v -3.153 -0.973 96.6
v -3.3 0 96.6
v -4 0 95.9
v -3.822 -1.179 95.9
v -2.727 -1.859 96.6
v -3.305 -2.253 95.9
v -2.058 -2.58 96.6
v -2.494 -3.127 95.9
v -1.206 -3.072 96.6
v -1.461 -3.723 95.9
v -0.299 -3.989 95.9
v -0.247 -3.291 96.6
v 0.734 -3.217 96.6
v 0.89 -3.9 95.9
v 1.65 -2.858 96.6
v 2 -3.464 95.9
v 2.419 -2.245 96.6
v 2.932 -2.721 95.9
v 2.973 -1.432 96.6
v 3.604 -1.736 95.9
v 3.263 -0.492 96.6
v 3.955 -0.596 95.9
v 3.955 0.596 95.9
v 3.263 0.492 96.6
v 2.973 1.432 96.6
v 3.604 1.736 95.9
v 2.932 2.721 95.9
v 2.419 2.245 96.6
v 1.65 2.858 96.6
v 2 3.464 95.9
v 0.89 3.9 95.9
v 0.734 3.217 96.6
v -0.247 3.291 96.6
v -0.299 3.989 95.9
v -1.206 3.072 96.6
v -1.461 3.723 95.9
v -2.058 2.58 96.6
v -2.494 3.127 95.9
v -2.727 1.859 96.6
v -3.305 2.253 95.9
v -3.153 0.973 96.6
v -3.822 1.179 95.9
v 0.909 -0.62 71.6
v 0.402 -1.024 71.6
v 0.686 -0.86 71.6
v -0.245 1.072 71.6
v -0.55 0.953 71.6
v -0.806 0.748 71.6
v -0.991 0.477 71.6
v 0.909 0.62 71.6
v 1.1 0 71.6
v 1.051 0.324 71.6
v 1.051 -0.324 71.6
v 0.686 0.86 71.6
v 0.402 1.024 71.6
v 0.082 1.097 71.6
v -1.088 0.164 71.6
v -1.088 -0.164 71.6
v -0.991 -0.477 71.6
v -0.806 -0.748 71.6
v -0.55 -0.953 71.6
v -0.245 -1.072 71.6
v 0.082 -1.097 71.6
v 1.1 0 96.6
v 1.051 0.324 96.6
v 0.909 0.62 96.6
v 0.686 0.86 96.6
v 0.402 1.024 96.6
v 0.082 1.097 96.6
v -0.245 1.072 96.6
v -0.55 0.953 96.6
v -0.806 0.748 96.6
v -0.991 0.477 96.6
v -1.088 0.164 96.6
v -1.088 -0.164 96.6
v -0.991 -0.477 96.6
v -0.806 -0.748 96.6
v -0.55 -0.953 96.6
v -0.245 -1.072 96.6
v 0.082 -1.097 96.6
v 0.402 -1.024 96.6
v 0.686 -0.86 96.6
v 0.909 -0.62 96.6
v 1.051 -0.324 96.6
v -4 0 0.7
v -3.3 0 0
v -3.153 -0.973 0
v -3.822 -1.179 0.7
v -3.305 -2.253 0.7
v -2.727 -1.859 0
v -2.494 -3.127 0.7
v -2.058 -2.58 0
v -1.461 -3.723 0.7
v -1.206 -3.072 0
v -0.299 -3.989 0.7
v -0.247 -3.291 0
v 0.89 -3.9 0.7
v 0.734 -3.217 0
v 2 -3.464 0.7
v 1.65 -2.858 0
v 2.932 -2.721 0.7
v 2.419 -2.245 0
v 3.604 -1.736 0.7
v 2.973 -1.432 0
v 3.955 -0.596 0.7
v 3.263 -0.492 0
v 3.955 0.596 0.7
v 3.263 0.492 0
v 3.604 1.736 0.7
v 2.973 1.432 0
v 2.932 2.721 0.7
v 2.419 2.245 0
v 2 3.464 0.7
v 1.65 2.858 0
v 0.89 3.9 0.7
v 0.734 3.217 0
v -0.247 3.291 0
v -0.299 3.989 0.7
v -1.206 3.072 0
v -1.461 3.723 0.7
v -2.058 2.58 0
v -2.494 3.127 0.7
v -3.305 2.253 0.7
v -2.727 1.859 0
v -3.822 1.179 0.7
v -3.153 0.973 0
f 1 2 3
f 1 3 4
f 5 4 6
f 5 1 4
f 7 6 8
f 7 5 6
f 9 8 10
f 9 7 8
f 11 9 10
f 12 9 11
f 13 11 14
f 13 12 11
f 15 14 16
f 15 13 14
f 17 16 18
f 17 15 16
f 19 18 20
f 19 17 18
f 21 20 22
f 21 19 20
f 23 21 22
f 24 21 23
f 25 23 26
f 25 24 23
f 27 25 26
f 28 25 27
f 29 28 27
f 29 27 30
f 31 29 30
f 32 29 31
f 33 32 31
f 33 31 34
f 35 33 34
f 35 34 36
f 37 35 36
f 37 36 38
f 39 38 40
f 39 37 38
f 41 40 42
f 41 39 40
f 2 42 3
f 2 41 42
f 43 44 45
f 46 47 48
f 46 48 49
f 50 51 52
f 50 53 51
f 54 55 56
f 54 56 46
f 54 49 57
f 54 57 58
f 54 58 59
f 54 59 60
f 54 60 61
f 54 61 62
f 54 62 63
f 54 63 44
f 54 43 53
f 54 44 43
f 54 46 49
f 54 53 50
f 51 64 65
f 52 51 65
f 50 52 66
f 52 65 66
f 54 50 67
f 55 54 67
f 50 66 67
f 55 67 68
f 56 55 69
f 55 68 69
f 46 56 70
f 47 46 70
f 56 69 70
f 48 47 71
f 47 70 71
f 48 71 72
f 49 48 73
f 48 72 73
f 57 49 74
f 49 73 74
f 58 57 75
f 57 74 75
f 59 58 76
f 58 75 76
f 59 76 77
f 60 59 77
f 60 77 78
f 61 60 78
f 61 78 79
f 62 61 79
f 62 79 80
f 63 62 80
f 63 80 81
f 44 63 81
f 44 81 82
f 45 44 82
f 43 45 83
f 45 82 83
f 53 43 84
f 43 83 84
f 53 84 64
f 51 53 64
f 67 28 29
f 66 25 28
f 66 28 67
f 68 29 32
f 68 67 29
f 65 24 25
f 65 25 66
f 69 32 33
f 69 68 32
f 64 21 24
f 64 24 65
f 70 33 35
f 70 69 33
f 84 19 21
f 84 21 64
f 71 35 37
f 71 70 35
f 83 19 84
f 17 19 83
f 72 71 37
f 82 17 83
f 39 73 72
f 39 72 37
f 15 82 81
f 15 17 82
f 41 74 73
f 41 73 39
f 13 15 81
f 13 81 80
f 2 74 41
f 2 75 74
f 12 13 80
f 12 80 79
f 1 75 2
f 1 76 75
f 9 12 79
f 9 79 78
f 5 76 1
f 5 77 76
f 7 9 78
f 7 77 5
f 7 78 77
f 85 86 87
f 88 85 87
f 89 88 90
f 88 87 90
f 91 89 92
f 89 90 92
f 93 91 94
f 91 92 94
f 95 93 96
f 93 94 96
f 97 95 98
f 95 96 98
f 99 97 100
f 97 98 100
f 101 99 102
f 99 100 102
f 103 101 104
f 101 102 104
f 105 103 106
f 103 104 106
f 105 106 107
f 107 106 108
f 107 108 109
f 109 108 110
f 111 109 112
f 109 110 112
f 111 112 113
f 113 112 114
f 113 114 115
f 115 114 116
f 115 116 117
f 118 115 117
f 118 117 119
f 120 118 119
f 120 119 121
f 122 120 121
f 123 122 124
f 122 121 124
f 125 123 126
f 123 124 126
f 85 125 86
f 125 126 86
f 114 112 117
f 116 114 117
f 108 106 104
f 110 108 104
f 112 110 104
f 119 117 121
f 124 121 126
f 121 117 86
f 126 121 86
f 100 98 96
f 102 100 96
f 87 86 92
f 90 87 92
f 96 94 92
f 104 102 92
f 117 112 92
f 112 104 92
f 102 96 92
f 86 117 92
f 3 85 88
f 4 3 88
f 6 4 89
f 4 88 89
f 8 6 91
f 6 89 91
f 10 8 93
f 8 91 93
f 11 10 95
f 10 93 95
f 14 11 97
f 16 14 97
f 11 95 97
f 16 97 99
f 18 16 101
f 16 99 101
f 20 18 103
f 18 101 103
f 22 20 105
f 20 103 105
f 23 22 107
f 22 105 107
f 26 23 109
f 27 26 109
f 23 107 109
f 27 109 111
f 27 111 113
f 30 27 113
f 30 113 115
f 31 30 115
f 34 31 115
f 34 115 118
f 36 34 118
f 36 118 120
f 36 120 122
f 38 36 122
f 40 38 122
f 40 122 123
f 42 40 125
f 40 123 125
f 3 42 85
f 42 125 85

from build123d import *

# Parameters (mm, degrees)
IZIM1_R                     = 4
Y_KSEKLIK_EKSTR_ZYON1_DEPTH = 96.6
IZIM3_R                     = 1.1
KES_EKSTR_ZYON2_DEPTH       = 25
PAH1_SIZE                   = 0.7
PAH2_SIZE                   = 0.7


with BuildPart() as part:
    # Çizim1 → Yükseklik-Ekstrüzyon1 (new body)
    with BuildSketch(Plane.XY):
        with Locations(Location((0, 0, 0), (0, 0, 180))):
            Circle(IZIM1_R)
    extrude(amount=Y_KSEKLIK_EKSTR_ZYON1_DEPTH)

    # Çizim3 → Kes-Ekstrüzyon2 (cut)
    with BuildSketch(Plane.XY.offset(96.6)):
        Circle(IZIM3_R)
    extrude(amount=-KES_EKSTR_ZYON2_DEPTH, mode=Mode.SUBTRACT)

    # Pah1
    pah1_edges = [part.edges().sort_by_distance(p)[0] for p in [
        (4, 0, 96.6),
    ]]
    chamfer(pah1_edges, length=PAH1_SIZE)

    # Pah2
    pah2_edges = [part.edges().sort_by_distance(p)[0] for p in [
        (4, 0, 0),
    ]]
    chamfer(pah2_edges, length=PAH2_SIZE)


solid = part.part
